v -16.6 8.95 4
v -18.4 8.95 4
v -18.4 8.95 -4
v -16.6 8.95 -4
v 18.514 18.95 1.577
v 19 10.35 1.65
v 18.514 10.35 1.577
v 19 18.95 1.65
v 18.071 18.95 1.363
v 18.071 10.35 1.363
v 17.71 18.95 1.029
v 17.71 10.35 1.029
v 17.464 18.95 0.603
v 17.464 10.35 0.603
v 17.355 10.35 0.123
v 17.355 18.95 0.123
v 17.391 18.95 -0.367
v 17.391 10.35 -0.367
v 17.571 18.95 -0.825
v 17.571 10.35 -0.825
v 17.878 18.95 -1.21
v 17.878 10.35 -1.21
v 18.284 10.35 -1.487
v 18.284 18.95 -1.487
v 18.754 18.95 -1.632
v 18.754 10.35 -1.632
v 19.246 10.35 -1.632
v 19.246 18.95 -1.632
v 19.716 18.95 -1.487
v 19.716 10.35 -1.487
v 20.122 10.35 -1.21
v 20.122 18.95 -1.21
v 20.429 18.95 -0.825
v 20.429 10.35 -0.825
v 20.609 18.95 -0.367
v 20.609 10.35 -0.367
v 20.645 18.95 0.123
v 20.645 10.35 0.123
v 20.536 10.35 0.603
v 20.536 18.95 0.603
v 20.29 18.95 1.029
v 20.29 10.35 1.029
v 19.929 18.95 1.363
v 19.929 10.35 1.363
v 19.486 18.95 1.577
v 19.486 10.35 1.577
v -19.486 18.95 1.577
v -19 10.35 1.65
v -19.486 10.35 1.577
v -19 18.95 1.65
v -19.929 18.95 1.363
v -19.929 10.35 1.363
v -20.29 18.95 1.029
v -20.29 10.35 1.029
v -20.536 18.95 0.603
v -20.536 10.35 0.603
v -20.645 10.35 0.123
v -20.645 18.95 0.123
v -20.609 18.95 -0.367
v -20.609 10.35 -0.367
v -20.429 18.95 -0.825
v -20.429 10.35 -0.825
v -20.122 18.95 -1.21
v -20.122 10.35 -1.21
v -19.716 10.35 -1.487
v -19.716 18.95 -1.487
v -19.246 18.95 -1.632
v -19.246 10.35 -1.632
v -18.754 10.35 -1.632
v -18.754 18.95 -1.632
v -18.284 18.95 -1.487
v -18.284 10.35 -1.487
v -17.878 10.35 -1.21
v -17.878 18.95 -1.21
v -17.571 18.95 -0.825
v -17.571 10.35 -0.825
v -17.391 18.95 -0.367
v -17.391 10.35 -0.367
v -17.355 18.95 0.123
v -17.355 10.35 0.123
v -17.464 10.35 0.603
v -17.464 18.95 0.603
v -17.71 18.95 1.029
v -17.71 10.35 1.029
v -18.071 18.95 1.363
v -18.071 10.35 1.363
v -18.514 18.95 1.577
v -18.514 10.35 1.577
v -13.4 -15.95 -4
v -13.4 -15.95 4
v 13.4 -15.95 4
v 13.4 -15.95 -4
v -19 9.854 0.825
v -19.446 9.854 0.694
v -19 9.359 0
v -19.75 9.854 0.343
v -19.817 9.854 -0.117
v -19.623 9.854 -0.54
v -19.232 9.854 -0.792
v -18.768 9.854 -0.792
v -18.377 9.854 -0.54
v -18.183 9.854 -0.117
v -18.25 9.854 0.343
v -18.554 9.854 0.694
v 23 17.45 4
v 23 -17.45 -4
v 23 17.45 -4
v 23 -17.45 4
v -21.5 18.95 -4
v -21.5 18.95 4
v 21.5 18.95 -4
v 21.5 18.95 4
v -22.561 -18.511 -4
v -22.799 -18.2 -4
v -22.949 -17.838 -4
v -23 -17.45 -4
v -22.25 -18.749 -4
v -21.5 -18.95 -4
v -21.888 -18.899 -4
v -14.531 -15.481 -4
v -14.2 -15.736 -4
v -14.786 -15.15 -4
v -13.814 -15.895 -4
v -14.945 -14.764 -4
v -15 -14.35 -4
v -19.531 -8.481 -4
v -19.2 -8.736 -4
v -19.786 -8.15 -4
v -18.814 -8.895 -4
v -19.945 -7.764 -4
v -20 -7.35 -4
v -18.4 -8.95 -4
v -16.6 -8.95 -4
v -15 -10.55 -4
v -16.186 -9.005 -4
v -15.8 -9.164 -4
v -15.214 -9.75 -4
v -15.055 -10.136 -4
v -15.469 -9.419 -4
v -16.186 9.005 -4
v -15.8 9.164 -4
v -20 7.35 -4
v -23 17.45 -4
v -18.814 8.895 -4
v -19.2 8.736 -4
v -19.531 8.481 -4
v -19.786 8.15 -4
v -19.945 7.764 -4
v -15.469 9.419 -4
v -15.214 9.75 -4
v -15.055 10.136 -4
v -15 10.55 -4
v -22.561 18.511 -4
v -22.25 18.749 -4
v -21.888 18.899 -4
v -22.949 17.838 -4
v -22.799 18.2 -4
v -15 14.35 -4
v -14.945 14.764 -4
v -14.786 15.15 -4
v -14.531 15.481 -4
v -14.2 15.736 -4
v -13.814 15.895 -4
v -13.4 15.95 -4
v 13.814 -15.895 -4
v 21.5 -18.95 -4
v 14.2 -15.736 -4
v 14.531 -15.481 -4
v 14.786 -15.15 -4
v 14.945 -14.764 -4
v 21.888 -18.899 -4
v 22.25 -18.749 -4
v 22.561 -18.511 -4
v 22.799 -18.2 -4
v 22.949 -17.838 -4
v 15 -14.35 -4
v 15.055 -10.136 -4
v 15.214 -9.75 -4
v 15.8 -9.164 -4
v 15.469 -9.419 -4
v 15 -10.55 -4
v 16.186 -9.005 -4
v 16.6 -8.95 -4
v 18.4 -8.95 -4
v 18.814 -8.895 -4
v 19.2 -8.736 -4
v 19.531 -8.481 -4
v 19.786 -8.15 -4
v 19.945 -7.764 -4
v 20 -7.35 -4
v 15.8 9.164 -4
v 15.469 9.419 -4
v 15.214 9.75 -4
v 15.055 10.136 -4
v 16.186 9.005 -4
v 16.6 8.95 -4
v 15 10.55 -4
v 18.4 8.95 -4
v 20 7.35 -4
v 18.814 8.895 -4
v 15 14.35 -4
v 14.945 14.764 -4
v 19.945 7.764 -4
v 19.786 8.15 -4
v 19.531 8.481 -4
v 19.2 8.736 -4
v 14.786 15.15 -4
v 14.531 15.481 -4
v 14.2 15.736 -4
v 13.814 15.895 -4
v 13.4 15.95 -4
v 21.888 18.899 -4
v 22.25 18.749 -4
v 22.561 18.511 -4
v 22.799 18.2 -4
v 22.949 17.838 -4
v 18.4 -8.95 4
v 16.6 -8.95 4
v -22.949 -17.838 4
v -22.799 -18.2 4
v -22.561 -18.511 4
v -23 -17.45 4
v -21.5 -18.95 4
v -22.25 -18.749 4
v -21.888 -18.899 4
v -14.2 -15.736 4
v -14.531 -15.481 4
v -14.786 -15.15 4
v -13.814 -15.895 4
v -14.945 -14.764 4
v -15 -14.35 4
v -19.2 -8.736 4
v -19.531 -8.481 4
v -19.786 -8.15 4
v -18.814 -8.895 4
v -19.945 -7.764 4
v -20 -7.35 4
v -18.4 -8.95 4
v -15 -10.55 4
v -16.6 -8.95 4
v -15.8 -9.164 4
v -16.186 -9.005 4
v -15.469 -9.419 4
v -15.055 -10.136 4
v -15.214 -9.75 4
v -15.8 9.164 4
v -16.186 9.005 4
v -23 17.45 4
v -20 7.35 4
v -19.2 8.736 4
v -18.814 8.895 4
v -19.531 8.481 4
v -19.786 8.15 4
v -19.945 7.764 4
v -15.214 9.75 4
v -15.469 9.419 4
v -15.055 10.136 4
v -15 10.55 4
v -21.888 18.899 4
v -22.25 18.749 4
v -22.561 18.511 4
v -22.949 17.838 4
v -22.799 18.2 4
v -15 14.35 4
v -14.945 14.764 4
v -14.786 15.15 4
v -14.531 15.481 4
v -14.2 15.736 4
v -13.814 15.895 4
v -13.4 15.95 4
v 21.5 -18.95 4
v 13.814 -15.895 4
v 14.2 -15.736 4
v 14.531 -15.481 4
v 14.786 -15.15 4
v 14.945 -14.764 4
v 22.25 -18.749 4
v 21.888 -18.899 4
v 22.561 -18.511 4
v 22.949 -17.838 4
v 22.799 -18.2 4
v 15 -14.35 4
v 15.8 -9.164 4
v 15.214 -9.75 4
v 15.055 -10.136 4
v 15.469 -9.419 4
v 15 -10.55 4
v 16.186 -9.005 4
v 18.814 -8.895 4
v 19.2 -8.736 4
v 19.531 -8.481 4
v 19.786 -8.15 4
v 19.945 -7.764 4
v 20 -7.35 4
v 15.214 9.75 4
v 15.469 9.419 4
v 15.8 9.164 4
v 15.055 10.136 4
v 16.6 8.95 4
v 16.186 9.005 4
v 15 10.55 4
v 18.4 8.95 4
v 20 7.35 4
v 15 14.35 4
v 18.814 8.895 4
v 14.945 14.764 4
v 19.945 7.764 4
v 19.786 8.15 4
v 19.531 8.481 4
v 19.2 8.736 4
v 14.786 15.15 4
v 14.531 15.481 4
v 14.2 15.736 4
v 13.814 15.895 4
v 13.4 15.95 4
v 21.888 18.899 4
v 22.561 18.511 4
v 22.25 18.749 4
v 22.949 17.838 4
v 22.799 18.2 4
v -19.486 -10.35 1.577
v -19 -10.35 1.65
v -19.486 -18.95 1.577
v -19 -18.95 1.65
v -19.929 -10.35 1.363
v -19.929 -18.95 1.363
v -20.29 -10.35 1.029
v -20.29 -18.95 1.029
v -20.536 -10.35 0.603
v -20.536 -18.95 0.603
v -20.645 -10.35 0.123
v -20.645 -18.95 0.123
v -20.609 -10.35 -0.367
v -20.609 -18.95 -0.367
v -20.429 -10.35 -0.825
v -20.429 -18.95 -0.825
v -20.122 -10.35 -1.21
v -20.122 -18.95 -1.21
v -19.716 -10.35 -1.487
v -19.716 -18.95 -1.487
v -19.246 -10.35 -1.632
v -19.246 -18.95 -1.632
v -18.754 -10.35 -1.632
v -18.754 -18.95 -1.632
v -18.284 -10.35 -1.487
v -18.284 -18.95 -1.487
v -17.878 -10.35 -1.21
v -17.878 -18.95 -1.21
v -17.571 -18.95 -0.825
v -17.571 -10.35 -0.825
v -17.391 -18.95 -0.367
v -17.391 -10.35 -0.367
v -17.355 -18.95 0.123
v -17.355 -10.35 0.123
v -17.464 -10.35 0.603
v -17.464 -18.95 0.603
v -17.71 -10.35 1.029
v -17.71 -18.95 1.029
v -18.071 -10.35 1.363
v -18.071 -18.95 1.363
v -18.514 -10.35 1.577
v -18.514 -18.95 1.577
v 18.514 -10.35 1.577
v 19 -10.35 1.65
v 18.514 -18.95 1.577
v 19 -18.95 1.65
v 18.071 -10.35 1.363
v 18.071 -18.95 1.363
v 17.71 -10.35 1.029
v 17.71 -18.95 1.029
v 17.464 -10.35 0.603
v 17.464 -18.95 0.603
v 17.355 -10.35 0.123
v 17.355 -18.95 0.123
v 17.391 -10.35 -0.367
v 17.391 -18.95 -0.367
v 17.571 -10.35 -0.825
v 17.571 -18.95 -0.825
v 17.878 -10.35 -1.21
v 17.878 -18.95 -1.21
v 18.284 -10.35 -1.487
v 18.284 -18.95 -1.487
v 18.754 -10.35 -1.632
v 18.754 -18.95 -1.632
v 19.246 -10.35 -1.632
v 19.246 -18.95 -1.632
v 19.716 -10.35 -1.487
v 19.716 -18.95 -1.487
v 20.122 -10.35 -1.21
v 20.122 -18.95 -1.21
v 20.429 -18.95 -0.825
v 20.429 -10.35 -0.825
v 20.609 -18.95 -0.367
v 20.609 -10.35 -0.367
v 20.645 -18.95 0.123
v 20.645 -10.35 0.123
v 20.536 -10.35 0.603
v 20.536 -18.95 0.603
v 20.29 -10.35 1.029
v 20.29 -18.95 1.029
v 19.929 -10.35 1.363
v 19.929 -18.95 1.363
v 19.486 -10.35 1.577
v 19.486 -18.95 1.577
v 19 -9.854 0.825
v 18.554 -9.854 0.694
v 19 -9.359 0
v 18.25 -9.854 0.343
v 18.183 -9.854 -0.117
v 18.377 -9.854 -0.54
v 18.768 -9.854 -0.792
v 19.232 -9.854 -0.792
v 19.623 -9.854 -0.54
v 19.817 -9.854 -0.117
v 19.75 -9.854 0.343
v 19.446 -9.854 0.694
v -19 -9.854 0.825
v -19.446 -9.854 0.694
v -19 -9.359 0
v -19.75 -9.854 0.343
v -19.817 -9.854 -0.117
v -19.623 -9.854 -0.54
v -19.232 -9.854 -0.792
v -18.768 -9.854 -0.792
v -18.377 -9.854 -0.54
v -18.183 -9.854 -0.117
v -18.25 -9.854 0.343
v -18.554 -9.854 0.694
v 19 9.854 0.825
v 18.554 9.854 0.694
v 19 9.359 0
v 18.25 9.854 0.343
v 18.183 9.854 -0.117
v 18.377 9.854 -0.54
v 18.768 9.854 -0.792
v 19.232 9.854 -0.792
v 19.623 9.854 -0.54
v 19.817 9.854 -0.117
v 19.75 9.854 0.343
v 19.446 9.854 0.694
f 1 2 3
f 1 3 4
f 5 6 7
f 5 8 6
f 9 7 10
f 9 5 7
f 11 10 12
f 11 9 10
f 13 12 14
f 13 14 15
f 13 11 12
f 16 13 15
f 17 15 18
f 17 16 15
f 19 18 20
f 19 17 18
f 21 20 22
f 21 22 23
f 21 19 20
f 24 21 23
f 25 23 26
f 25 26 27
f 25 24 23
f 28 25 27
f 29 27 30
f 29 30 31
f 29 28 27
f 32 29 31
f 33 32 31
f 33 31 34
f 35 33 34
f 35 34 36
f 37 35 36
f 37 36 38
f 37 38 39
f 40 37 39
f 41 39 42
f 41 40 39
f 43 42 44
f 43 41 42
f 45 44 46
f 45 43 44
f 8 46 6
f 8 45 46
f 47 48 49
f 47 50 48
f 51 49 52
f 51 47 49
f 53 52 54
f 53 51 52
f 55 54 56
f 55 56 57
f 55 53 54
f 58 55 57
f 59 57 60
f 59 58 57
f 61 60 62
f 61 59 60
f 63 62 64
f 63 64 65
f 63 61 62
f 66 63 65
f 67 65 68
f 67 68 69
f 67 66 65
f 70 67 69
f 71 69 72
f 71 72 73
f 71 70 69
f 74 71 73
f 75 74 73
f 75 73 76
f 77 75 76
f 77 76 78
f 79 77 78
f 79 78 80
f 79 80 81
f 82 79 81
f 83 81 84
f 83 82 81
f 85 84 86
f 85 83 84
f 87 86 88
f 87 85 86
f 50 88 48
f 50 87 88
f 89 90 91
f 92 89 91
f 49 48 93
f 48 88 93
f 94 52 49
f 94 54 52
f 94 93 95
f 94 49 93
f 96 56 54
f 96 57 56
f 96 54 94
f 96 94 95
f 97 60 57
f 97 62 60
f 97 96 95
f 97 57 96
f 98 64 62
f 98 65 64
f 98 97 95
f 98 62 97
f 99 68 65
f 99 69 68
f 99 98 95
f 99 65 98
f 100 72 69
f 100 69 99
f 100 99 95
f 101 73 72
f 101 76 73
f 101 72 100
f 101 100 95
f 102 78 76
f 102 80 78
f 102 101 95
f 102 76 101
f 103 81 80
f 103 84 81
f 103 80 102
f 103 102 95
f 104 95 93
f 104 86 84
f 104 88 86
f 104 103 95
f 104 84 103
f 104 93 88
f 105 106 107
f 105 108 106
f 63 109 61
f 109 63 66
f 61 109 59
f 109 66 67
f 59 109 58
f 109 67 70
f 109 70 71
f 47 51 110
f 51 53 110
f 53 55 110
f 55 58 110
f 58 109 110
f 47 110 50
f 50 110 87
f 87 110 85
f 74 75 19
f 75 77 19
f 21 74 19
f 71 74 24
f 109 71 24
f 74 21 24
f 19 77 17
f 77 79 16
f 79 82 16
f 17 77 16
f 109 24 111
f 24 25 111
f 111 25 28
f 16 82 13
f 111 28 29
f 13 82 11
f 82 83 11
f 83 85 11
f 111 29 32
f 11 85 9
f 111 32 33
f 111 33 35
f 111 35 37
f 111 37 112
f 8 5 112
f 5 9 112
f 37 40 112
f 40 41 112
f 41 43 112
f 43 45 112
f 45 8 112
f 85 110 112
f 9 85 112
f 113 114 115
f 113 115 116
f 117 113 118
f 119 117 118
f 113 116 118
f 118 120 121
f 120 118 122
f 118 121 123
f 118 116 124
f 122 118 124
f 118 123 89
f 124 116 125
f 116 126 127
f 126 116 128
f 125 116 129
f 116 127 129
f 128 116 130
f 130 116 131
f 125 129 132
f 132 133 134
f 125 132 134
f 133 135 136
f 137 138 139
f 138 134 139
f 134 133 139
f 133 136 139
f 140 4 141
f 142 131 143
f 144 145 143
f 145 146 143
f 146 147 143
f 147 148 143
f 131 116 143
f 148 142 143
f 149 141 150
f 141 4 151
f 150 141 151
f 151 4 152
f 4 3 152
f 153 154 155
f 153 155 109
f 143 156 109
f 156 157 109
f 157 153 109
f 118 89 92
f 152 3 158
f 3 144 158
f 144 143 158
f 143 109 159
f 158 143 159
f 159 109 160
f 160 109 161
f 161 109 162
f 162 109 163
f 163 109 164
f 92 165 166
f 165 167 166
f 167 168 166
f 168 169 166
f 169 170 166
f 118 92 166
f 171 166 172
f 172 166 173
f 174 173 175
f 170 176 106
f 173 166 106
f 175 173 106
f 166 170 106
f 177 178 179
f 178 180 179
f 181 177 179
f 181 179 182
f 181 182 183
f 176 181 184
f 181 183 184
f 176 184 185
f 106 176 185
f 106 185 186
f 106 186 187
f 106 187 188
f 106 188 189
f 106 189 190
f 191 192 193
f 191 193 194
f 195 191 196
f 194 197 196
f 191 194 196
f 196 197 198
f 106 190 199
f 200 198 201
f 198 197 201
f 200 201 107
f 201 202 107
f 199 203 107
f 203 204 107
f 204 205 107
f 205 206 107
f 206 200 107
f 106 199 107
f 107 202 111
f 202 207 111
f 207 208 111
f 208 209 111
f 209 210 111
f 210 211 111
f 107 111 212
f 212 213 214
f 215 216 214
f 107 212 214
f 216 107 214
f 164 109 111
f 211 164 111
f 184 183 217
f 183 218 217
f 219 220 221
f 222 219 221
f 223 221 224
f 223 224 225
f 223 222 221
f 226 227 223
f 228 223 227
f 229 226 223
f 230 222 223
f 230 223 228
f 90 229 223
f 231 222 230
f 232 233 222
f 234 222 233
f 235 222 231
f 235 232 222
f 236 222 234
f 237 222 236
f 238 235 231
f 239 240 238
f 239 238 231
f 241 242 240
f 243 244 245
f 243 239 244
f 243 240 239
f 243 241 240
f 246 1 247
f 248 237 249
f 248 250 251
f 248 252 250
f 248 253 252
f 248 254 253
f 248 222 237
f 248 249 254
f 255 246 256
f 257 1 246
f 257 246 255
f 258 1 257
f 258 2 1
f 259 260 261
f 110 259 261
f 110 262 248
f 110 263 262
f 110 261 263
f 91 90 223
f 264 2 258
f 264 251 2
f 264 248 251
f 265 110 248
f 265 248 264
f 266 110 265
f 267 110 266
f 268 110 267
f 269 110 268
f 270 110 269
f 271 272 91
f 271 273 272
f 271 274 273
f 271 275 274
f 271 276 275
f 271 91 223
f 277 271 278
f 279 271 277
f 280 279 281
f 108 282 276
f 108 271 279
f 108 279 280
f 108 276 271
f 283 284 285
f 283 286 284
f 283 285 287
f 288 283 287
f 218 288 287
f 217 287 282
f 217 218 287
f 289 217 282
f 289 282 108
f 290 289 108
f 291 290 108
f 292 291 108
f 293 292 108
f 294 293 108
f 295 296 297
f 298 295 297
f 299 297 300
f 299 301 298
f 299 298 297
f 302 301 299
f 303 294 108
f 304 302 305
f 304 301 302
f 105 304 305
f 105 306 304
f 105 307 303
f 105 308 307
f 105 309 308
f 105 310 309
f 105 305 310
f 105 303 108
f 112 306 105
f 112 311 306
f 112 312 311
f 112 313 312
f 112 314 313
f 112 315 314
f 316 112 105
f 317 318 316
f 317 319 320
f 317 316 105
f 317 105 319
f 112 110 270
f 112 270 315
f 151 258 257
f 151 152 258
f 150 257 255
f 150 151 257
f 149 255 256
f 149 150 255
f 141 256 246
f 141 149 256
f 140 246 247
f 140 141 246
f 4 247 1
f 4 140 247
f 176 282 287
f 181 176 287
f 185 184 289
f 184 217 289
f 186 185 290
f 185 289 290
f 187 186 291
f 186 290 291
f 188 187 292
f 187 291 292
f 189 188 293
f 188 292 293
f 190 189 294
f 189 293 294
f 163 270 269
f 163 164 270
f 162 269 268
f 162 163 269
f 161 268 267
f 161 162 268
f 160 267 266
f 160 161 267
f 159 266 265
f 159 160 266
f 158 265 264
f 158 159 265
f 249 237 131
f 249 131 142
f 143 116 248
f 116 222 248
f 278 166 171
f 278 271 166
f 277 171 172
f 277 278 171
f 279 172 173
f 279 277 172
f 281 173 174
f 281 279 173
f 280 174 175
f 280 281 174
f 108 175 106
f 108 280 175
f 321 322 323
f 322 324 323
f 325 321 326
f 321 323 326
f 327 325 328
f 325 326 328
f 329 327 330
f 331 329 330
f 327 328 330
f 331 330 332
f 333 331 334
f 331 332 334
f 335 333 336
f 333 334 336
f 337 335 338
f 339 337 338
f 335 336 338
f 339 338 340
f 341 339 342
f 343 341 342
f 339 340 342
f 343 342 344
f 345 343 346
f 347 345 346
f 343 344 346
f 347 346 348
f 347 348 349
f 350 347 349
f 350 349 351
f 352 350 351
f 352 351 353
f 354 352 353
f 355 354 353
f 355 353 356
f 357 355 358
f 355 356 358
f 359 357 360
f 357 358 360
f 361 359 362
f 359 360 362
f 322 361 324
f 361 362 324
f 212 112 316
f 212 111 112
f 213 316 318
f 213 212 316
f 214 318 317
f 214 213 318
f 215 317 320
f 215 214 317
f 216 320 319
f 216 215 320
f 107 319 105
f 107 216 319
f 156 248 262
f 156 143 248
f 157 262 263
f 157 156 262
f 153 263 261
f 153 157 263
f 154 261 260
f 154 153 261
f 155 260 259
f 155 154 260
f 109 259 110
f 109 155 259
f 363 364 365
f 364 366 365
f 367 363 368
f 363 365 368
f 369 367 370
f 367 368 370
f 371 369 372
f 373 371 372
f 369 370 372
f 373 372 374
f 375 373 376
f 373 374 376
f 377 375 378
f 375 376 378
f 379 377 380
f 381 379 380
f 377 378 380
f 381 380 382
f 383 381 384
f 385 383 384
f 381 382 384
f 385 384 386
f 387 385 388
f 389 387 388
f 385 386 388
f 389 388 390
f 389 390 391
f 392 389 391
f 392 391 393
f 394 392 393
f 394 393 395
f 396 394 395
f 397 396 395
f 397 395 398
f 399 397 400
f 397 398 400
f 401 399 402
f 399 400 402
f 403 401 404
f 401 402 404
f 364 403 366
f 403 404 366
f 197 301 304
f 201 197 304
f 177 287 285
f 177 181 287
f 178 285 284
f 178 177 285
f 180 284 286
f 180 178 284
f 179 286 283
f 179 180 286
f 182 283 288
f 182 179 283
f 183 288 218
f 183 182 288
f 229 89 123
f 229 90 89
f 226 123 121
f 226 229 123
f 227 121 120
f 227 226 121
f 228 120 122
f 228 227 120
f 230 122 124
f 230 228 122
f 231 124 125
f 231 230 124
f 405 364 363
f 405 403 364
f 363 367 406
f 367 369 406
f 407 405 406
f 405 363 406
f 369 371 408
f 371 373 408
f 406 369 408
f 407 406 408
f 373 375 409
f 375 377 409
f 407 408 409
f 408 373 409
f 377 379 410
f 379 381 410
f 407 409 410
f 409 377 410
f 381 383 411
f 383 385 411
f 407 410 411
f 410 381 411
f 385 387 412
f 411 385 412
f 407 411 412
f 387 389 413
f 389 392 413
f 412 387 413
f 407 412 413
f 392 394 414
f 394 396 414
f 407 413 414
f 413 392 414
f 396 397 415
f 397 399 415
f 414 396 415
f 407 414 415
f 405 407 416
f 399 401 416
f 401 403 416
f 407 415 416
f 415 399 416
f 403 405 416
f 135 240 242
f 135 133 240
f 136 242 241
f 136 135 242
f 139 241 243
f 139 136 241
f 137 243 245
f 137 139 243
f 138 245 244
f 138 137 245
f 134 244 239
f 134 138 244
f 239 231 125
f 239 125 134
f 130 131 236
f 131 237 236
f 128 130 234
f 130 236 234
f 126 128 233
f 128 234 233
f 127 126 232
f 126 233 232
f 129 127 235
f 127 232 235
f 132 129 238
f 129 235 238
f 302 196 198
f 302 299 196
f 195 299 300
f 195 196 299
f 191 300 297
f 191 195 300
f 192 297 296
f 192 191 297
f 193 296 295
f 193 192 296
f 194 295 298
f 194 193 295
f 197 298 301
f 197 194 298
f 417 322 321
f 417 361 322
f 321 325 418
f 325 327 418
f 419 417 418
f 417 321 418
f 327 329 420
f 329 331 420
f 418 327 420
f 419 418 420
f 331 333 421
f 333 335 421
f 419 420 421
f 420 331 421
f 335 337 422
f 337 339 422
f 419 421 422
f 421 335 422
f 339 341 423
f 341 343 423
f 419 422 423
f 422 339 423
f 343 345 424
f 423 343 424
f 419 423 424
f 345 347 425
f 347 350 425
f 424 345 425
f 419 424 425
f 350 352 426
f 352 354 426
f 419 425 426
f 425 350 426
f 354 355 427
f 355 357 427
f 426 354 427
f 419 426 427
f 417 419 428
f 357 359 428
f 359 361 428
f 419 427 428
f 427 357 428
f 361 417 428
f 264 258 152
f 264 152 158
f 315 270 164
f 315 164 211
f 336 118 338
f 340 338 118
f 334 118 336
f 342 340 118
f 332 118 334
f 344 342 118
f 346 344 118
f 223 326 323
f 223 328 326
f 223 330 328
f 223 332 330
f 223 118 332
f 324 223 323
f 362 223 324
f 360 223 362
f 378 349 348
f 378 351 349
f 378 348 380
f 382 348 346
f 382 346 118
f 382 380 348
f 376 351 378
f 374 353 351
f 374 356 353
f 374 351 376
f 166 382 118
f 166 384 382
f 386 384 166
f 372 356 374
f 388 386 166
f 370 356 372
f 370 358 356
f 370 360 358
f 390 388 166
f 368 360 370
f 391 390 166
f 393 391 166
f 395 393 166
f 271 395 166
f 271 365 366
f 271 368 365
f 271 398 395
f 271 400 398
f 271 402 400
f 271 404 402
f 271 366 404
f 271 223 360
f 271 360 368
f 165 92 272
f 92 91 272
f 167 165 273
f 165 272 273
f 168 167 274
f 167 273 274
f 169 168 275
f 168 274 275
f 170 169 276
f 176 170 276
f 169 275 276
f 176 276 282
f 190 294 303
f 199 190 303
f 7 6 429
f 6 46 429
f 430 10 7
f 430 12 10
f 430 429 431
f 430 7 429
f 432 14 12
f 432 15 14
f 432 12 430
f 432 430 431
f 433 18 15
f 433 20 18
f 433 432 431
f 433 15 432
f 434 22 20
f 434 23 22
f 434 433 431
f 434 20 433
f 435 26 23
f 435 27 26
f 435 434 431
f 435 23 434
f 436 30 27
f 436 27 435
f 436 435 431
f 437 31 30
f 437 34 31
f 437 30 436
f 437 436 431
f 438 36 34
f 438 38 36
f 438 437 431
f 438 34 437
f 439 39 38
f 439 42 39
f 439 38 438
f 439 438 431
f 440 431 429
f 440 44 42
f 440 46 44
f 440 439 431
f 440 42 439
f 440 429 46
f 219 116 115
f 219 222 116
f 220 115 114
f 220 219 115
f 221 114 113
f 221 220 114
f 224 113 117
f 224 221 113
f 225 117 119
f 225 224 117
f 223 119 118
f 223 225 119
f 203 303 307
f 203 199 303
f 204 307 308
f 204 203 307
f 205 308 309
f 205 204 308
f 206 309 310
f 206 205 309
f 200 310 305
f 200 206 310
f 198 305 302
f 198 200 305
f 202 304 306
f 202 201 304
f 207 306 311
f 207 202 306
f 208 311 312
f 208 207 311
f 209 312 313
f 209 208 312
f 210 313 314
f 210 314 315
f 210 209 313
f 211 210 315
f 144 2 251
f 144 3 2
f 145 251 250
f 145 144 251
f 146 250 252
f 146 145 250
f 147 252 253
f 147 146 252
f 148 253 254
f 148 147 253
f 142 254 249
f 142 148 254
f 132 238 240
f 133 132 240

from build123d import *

# Parameters (mm, degrees)
SKETCH_1_W                  = 46
SKETCH_1_H                  = 37.9
EXTRUDE_1_DEPTH             = 4
HOLE_WIZARD_M4_1_AT_2_COUNT = 2
HOLE_WIZARD_M4_1_AT_2_PITCH = 38
SKETCH_5_W                  = 30
SKETCH_5_H                  = 31.9
CUT_EXTRUDE_1_DEPTH         = 19
SKETCH_6_W                  = 40
SKETCH_6_H                  = 17.9
CUT_EXTRUDE_2_DEPTH         = 34
FILLET_1_R                  = 1.6
FILLET_2_R                  = 1.5


with BuildPart() as part:
    # 草图1 → 凸台-拉伸1 (new, symmetric)
    with BuildSketch(Plane.XY):
        Rectangle(SKETCH_1_W, SKETCH_1_H)
    extrude(amount=EXTRUDE_1_DEPTH, both=True)

    # 草图4 → M4 螺纹孔1 (revolve, cut)
    with BuildSketch(Plane(origin=(-19, 18.95, 0), x_dir=(0, 0, 1), z_dir=(1, 0, 0))):
        Polygon((0, 0), (0, 9.591420021), (1.65, 8.6), (1.65, 0), align=None)
    hole_wizard_m4_1 = revolve(axis=Axis((-19, 25.3, 0), (0, -1, 0)), mode=Mode.SUBTRACT)

    # M4 螺纹孔1 at 2: M4 螺纹孔1 ×2
    with Locations(*[(i * HOLE_WIZARD_M4_1_AT_2_PITCH, 0, 0) for i in range(1, HOLE_WIZARD_M4_1_AT_2_COUNT)]):
        add(hole_wizard_m4_1, mode=Mode.SUBTRACT)

    # 镜向1: M4 螺纹孔1 across plane
    add(hole_wizard_m4_1.mirror(Plane.ZX), mode=Mode.SUBTRACT)

    # 镜向1 copy 1 sketch → 镜向1 copy 1 (revolve, cut)
    with BuildSketch(Plane(origin=(19, -18.95, 0), x_dir=(0, 0, 1), z_dir=(1, 0, 0))):
        Polygon((0, 0), (0, -9.591420021), (1.65, -8.6), (1.65, 0), align=None)
    revolve(axis=Axis((19, -25.3, 0), (0, -1, 0)), mode=Mode.SUBTRACT)

    # 草图5 → 切除-拉伸1 (cut, symmetric)
    with BuildSketch(Plane.XY.offset(4)):
        Rectangle(SKETCH_5_W, SKETCH_5_H)
    extrude(amount=CUT_EXTRUDE_1_DEPTH, both=True, mode=Mode.SUBTRACT)

    # 草图6 → 切除-拉伸2 (cut, symmetric)
    with BuildSketch(Plane.XY.offset(4)):
        Rectangle(SKETCH_6_W, SKETCH_6_H)
    extrude(amount=CUT_EXTRUDE_2_DEPTH, both=True, mode=Mode.SUBTRACT)

    # 圆角1
    fillet_1_edges = [part.edges().sort_by_distance(p)[0] for p in [
        (15, 15.95, 0),
        (15, -15.95, 0),
        (-15, -15.95, 0),
        (-15, 15.95, 0),
        (-15, 8.95, 0),
        (-15, -8.95, 0),
        (20, 8.95, 0),
        (-20, -8.95, 0),
        (20, -8.95, 0),
        (15, -8.95, 0),
        (15, 8.95, 0),
        (-20, 8.95, 0),
    ]]
    fillet(fillet_1_edges, radius=FILLET_1_R)

    # 圆角2
    fillet_2_edges = [part.edges().sort_by_distance(p)[0] for p in [
        (23, -18.95, 0),
        (-23, -18.95, 0),
        (-23, 18.95, 0),
        (23, 18.95, 0),
    ]]
    fillet(fillet_2_edges, radius=FILLET_2_R)


solid = part.part
